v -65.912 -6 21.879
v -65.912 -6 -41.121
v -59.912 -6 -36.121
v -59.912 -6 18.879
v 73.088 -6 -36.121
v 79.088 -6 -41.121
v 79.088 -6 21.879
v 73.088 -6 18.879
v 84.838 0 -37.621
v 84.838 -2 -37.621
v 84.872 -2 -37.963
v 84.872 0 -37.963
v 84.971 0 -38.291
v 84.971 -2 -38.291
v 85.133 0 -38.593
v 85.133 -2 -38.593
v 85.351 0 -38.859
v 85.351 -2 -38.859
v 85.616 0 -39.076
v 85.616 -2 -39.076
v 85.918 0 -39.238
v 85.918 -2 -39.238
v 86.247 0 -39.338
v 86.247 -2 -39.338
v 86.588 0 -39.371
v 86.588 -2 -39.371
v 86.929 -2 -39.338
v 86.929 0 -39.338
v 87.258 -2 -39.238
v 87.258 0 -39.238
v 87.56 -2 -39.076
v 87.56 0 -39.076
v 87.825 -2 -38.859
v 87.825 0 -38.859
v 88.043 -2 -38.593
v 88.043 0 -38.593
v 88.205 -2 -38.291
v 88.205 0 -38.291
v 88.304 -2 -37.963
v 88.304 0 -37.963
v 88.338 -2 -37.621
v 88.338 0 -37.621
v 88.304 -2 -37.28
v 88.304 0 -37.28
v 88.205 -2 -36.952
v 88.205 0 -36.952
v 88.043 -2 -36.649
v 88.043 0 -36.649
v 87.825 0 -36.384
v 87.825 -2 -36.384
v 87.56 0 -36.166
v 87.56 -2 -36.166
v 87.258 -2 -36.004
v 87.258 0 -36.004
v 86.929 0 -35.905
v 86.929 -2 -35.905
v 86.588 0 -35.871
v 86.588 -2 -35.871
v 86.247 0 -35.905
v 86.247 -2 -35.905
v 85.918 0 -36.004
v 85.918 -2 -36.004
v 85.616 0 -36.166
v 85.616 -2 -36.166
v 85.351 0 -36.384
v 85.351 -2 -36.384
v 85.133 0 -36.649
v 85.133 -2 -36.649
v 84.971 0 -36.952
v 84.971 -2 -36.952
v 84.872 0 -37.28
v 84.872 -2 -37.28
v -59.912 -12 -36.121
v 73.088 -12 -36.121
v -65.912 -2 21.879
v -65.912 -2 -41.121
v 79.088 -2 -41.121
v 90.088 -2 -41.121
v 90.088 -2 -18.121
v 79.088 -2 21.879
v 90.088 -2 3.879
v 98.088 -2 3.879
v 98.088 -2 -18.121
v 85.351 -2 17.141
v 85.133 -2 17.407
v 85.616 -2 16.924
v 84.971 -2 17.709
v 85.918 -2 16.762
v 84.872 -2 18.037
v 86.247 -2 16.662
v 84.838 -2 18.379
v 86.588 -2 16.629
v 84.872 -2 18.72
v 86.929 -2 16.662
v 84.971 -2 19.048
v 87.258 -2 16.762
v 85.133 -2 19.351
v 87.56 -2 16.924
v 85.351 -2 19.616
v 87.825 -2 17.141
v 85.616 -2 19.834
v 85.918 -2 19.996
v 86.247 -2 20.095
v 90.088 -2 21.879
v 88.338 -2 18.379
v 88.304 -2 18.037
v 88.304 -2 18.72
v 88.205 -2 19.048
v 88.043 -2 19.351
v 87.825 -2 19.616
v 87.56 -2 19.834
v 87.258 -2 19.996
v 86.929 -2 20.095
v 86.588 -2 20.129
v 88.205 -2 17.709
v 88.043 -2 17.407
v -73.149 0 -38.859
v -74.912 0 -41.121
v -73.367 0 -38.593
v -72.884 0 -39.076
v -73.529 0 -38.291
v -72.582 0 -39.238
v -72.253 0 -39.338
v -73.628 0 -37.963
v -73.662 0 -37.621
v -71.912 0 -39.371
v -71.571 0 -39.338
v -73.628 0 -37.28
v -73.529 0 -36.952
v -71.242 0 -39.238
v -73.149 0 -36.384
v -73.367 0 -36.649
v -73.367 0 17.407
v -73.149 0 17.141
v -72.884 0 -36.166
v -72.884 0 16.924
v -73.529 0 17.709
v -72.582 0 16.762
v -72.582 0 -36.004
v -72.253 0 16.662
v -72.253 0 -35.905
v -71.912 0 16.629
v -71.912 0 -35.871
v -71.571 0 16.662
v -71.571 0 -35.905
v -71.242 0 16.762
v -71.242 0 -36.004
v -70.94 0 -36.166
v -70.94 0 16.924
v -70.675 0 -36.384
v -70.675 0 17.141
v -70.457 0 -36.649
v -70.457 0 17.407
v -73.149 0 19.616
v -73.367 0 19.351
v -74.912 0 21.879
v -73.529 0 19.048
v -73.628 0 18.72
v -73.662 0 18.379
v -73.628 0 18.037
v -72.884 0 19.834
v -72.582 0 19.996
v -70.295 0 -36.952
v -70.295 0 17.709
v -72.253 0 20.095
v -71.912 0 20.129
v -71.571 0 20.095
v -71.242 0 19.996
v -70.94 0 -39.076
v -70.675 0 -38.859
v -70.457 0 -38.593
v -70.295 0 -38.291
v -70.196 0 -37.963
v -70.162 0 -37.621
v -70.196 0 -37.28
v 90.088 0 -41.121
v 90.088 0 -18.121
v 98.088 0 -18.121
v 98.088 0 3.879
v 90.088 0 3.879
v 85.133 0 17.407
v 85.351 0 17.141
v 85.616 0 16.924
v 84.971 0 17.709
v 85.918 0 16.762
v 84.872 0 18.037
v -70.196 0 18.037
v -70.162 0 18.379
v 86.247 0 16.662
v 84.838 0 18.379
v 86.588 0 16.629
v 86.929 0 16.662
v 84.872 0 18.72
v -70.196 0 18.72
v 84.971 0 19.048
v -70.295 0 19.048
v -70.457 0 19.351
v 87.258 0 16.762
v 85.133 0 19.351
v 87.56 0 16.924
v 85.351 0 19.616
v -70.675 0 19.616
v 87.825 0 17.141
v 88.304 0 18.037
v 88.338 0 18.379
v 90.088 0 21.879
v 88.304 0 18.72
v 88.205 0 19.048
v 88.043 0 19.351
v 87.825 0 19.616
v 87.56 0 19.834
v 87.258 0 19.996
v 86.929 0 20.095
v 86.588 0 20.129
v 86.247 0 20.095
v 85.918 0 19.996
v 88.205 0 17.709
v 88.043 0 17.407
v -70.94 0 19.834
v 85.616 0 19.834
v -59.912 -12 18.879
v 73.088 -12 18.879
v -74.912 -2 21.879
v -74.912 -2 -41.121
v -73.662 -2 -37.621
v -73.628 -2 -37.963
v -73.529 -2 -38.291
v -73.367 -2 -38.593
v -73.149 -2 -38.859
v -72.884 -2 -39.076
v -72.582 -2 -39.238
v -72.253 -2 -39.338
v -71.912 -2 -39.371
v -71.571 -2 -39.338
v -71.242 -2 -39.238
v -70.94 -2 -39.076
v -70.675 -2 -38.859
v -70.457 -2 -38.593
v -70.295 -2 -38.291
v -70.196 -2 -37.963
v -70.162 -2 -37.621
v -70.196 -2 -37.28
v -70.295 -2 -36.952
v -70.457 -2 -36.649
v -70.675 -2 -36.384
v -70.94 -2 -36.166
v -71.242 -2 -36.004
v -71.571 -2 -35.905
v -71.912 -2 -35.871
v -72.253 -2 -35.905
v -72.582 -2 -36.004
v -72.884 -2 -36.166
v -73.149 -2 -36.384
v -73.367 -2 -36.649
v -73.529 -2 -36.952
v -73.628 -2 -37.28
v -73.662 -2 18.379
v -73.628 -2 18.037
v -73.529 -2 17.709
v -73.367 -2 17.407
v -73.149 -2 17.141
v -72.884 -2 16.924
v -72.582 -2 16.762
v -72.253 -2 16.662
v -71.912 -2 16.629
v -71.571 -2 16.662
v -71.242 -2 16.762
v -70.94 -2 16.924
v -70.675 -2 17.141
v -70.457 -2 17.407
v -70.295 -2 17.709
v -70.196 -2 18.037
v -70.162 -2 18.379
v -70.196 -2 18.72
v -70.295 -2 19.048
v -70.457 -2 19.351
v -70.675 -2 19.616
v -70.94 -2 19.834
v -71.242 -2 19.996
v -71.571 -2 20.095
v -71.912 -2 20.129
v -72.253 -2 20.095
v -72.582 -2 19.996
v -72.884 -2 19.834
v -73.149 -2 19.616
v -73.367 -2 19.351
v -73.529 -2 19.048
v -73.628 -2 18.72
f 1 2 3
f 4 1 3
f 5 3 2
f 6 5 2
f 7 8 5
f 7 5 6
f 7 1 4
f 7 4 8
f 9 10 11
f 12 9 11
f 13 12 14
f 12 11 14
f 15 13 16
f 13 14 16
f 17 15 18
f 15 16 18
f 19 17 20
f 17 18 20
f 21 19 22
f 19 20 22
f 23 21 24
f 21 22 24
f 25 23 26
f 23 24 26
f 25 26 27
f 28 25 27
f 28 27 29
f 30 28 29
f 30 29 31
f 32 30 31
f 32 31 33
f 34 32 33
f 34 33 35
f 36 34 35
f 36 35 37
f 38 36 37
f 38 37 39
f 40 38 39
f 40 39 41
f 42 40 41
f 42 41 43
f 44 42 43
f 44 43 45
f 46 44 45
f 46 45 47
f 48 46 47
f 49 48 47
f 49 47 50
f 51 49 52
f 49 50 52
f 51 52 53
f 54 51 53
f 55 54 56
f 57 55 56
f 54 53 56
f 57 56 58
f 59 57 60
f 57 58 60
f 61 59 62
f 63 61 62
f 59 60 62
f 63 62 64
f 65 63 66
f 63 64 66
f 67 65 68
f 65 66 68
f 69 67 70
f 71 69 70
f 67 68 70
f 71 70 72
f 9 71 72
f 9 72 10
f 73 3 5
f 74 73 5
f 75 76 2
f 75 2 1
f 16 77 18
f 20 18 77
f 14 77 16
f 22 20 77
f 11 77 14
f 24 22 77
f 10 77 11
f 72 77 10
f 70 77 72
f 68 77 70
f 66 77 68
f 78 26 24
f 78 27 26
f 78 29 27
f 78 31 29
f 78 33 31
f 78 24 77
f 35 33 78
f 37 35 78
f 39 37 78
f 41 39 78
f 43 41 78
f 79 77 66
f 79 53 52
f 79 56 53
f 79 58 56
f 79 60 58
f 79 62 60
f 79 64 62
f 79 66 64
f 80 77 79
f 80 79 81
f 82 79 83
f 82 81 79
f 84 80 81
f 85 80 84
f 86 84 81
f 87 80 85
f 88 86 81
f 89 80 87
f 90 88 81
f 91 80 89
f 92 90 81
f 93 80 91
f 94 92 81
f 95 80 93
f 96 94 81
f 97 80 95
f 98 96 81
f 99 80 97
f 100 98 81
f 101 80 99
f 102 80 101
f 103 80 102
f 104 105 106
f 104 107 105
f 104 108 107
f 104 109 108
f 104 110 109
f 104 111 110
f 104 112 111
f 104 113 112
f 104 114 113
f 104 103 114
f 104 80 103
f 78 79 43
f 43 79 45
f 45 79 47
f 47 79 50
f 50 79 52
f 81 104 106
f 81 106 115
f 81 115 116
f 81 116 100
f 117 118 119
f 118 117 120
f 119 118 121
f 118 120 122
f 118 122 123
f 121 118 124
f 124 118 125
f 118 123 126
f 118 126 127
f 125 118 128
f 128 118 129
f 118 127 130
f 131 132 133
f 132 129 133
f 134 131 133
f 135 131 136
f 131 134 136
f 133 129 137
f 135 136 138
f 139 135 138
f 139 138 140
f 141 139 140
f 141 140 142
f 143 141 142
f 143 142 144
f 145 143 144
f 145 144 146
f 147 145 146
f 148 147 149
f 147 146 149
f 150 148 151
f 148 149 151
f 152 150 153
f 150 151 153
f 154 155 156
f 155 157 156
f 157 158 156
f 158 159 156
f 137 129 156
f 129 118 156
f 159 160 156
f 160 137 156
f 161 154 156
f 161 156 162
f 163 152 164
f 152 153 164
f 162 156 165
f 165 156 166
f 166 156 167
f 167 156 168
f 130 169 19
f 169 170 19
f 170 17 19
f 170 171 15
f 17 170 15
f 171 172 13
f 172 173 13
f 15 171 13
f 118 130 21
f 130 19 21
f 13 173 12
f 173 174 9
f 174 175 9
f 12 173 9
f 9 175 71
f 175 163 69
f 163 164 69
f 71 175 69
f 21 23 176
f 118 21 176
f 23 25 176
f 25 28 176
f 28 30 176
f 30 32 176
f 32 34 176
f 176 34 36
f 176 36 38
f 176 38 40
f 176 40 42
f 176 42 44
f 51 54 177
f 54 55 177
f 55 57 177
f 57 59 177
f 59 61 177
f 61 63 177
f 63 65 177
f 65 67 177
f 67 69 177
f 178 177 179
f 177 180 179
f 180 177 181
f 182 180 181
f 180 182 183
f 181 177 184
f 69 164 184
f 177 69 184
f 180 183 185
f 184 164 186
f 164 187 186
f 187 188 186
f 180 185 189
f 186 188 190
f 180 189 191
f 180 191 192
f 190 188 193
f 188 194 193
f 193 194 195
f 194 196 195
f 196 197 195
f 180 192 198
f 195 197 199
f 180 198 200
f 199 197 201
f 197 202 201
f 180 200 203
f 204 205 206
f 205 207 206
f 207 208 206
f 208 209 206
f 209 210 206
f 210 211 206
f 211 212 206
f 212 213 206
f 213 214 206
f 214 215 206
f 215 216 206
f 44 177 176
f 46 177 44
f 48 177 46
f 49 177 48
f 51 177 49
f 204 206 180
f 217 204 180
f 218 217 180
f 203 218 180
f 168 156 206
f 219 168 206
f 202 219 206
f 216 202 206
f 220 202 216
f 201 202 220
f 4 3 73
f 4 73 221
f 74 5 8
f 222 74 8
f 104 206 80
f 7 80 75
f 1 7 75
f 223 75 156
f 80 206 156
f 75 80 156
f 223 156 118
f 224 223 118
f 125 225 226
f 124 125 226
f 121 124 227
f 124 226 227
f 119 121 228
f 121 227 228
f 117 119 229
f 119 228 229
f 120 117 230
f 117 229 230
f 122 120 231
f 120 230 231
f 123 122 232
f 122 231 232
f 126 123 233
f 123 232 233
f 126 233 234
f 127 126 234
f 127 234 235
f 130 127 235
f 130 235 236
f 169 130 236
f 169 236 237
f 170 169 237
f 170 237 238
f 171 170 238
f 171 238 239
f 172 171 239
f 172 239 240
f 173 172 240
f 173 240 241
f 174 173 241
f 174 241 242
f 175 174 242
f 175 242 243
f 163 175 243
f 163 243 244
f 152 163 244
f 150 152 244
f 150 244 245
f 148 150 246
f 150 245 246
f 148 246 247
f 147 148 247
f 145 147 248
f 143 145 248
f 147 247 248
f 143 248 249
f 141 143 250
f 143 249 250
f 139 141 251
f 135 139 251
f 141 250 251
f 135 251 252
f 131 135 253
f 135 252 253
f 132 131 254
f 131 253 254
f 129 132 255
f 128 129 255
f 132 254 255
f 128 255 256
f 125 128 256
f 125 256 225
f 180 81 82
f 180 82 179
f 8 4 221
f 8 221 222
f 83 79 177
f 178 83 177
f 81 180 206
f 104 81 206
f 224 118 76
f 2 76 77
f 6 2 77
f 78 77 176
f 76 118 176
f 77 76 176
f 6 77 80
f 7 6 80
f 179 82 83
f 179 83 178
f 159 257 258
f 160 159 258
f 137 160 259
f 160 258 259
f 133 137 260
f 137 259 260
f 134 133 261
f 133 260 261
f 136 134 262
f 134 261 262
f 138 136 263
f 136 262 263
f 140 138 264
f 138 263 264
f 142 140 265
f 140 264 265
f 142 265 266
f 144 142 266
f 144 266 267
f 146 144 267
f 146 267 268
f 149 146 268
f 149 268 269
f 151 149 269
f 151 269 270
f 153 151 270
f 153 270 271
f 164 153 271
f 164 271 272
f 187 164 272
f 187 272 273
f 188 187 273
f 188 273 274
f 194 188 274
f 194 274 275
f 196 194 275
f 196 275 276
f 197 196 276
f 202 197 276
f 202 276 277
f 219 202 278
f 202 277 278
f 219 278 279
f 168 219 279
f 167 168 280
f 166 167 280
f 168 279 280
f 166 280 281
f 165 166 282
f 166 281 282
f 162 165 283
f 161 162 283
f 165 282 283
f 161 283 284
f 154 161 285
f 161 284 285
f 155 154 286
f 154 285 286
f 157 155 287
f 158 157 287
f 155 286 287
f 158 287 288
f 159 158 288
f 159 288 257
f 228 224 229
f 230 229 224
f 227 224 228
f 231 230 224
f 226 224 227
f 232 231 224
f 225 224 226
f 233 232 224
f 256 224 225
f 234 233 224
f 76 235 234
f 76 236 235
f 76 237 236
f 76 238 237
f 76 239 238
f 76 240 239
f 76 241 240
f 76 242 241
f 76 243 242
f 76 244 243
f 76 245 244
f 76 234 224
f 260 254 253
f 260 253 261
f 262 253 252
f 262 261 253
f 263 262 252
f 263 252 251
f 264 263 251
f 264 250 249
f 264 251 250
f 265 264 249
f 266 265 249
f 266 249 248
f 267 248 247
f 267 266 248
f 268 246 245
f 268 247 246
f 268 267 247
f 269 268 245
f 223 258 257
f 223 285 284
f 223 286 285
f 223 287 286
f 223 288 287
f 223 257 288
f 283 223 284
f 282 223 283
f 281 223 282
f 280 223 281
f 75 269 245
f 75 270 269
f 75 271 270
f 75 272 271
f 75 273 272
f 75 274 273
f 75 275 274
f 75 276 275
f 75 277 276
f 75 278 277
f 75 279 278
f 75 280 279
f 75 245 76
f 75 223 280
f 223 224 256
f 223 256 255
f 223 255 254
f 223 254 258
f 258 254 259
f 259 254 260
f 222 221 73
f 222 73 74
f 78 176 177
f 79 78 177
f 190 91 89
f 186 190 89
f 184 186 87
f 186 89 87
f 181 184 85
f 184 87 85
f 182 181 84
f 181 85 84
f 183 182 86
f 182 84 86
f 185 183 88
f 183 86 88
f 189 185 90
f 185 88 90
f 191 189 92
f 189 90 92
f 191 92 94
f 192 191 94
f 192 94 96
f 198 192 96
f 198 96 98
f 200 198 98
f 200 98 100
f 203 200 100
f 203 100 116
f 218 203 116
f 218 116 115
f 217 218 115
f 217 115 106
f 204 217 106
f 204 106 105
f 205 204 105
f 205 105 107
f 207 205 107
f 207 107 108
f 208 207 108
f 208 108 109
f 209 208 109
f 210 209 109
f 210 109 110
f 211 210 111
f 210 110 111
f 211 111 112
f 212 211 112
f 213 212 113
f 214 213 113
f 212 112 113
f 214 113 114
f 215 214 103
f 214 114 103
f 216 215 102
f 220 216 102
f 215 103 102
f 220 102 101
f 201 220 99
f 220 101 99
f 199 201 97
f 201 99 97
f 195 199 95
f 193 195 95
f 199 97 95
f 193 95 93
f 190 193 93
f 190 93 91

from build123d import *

# Parameters (mm, degrees)
F0_W     = 158.5
F0_H     = 56
F0_H_2   = 3.5
F0_W_2   = 3
F0_W_3   = 3.5
F1_DEPTH = 2
F2_D     = 3.5
F3_W     = 145
F3_H     = 63
F4_DEPTH = 4
F5_W     = 2
F5_H     = 22
F6_DEPTH = 8
F7_W     = 133
F7_H     = 55
F8_DEPTH = 6


with BuildPart() as f1:
    # F0 (on Front) → F1 (new body)
    with BuildSketch(Plane.XZ):
        with Locations((7.3379711658, -9.6212180674)):
            Rectangle(F0_W, F0_H)
        with Locations((7.3379711658, 20.1287819326)):
            Rectangle(F0_W, F0_H_2)
        with Locations((-73.4120288342, -9.6212180674)):
            Rectangle(F0_W_2, F0_H)
        with Locations((-73.4120288342, 20.1287819326)):
            Rectangle(F0_W_2, F0_H_2)
        with Locations((-73.4120288342, -39.3712180674)):
            Rectangle(F0_W_2, F0_H_2)
        with Locations((7.3379711658, -39.3712180674)):
            Rectangle(F0_W, F0_H_2)
        with Locations((88.3379711658, 20.1287819326)):
            Rectangle(F0_W_3, F0_H_2)
        with Locations((88.3379711658, -9.6212180674)):
            Rectangle(F0_W_3, F0_H)
        with Locations((88.3379711658, -39.3712180674)):
            Rectangle(F0_W_3, F0_H_2)
    extrude(amount=F1_DEPTH)

    # F2 (through all)
    with Locations(Plane(origin=(0, 0, 0), x_dir=(1, 0, 0), z_dir=(0, 1, 0))):
        with Locations((-71.9120288342, -18.3787819326), (86.5879711658, -18.3787819326), (86.5879711658, 37.6212180674), (-71.9120288342, 37.6212180674)):
            Hole(F2_D / 2)

    # F3 (on face) → F4 (join)
    with BuildSketch(Plane.XZ.offset(2)):
        with Locations((6.5879711658, -9.6212180674)):
            Rectangle(F3_W, F3_H)
    extrude(amount=F4_DEPTH)

    # F5 (on face) → F6 (join)
    with BuildSketch(Plane.YZ.offset(90.0879711658)):
        with Locations((-1, -7.1212180674)):
            Rectangle(F5_W, F5_H)
    extrude(amount=F6_DEPTH)

    # F7 (on face) → F8 (join)
    with BuildSketch(Plane.XZ.offset(6)):
        with Locations((6.5879711658, -8.6212180674)):
            Rectangle(F7_W, F7_H)
    extrude(amount=F8_DEPTH)


solid = f1.part
